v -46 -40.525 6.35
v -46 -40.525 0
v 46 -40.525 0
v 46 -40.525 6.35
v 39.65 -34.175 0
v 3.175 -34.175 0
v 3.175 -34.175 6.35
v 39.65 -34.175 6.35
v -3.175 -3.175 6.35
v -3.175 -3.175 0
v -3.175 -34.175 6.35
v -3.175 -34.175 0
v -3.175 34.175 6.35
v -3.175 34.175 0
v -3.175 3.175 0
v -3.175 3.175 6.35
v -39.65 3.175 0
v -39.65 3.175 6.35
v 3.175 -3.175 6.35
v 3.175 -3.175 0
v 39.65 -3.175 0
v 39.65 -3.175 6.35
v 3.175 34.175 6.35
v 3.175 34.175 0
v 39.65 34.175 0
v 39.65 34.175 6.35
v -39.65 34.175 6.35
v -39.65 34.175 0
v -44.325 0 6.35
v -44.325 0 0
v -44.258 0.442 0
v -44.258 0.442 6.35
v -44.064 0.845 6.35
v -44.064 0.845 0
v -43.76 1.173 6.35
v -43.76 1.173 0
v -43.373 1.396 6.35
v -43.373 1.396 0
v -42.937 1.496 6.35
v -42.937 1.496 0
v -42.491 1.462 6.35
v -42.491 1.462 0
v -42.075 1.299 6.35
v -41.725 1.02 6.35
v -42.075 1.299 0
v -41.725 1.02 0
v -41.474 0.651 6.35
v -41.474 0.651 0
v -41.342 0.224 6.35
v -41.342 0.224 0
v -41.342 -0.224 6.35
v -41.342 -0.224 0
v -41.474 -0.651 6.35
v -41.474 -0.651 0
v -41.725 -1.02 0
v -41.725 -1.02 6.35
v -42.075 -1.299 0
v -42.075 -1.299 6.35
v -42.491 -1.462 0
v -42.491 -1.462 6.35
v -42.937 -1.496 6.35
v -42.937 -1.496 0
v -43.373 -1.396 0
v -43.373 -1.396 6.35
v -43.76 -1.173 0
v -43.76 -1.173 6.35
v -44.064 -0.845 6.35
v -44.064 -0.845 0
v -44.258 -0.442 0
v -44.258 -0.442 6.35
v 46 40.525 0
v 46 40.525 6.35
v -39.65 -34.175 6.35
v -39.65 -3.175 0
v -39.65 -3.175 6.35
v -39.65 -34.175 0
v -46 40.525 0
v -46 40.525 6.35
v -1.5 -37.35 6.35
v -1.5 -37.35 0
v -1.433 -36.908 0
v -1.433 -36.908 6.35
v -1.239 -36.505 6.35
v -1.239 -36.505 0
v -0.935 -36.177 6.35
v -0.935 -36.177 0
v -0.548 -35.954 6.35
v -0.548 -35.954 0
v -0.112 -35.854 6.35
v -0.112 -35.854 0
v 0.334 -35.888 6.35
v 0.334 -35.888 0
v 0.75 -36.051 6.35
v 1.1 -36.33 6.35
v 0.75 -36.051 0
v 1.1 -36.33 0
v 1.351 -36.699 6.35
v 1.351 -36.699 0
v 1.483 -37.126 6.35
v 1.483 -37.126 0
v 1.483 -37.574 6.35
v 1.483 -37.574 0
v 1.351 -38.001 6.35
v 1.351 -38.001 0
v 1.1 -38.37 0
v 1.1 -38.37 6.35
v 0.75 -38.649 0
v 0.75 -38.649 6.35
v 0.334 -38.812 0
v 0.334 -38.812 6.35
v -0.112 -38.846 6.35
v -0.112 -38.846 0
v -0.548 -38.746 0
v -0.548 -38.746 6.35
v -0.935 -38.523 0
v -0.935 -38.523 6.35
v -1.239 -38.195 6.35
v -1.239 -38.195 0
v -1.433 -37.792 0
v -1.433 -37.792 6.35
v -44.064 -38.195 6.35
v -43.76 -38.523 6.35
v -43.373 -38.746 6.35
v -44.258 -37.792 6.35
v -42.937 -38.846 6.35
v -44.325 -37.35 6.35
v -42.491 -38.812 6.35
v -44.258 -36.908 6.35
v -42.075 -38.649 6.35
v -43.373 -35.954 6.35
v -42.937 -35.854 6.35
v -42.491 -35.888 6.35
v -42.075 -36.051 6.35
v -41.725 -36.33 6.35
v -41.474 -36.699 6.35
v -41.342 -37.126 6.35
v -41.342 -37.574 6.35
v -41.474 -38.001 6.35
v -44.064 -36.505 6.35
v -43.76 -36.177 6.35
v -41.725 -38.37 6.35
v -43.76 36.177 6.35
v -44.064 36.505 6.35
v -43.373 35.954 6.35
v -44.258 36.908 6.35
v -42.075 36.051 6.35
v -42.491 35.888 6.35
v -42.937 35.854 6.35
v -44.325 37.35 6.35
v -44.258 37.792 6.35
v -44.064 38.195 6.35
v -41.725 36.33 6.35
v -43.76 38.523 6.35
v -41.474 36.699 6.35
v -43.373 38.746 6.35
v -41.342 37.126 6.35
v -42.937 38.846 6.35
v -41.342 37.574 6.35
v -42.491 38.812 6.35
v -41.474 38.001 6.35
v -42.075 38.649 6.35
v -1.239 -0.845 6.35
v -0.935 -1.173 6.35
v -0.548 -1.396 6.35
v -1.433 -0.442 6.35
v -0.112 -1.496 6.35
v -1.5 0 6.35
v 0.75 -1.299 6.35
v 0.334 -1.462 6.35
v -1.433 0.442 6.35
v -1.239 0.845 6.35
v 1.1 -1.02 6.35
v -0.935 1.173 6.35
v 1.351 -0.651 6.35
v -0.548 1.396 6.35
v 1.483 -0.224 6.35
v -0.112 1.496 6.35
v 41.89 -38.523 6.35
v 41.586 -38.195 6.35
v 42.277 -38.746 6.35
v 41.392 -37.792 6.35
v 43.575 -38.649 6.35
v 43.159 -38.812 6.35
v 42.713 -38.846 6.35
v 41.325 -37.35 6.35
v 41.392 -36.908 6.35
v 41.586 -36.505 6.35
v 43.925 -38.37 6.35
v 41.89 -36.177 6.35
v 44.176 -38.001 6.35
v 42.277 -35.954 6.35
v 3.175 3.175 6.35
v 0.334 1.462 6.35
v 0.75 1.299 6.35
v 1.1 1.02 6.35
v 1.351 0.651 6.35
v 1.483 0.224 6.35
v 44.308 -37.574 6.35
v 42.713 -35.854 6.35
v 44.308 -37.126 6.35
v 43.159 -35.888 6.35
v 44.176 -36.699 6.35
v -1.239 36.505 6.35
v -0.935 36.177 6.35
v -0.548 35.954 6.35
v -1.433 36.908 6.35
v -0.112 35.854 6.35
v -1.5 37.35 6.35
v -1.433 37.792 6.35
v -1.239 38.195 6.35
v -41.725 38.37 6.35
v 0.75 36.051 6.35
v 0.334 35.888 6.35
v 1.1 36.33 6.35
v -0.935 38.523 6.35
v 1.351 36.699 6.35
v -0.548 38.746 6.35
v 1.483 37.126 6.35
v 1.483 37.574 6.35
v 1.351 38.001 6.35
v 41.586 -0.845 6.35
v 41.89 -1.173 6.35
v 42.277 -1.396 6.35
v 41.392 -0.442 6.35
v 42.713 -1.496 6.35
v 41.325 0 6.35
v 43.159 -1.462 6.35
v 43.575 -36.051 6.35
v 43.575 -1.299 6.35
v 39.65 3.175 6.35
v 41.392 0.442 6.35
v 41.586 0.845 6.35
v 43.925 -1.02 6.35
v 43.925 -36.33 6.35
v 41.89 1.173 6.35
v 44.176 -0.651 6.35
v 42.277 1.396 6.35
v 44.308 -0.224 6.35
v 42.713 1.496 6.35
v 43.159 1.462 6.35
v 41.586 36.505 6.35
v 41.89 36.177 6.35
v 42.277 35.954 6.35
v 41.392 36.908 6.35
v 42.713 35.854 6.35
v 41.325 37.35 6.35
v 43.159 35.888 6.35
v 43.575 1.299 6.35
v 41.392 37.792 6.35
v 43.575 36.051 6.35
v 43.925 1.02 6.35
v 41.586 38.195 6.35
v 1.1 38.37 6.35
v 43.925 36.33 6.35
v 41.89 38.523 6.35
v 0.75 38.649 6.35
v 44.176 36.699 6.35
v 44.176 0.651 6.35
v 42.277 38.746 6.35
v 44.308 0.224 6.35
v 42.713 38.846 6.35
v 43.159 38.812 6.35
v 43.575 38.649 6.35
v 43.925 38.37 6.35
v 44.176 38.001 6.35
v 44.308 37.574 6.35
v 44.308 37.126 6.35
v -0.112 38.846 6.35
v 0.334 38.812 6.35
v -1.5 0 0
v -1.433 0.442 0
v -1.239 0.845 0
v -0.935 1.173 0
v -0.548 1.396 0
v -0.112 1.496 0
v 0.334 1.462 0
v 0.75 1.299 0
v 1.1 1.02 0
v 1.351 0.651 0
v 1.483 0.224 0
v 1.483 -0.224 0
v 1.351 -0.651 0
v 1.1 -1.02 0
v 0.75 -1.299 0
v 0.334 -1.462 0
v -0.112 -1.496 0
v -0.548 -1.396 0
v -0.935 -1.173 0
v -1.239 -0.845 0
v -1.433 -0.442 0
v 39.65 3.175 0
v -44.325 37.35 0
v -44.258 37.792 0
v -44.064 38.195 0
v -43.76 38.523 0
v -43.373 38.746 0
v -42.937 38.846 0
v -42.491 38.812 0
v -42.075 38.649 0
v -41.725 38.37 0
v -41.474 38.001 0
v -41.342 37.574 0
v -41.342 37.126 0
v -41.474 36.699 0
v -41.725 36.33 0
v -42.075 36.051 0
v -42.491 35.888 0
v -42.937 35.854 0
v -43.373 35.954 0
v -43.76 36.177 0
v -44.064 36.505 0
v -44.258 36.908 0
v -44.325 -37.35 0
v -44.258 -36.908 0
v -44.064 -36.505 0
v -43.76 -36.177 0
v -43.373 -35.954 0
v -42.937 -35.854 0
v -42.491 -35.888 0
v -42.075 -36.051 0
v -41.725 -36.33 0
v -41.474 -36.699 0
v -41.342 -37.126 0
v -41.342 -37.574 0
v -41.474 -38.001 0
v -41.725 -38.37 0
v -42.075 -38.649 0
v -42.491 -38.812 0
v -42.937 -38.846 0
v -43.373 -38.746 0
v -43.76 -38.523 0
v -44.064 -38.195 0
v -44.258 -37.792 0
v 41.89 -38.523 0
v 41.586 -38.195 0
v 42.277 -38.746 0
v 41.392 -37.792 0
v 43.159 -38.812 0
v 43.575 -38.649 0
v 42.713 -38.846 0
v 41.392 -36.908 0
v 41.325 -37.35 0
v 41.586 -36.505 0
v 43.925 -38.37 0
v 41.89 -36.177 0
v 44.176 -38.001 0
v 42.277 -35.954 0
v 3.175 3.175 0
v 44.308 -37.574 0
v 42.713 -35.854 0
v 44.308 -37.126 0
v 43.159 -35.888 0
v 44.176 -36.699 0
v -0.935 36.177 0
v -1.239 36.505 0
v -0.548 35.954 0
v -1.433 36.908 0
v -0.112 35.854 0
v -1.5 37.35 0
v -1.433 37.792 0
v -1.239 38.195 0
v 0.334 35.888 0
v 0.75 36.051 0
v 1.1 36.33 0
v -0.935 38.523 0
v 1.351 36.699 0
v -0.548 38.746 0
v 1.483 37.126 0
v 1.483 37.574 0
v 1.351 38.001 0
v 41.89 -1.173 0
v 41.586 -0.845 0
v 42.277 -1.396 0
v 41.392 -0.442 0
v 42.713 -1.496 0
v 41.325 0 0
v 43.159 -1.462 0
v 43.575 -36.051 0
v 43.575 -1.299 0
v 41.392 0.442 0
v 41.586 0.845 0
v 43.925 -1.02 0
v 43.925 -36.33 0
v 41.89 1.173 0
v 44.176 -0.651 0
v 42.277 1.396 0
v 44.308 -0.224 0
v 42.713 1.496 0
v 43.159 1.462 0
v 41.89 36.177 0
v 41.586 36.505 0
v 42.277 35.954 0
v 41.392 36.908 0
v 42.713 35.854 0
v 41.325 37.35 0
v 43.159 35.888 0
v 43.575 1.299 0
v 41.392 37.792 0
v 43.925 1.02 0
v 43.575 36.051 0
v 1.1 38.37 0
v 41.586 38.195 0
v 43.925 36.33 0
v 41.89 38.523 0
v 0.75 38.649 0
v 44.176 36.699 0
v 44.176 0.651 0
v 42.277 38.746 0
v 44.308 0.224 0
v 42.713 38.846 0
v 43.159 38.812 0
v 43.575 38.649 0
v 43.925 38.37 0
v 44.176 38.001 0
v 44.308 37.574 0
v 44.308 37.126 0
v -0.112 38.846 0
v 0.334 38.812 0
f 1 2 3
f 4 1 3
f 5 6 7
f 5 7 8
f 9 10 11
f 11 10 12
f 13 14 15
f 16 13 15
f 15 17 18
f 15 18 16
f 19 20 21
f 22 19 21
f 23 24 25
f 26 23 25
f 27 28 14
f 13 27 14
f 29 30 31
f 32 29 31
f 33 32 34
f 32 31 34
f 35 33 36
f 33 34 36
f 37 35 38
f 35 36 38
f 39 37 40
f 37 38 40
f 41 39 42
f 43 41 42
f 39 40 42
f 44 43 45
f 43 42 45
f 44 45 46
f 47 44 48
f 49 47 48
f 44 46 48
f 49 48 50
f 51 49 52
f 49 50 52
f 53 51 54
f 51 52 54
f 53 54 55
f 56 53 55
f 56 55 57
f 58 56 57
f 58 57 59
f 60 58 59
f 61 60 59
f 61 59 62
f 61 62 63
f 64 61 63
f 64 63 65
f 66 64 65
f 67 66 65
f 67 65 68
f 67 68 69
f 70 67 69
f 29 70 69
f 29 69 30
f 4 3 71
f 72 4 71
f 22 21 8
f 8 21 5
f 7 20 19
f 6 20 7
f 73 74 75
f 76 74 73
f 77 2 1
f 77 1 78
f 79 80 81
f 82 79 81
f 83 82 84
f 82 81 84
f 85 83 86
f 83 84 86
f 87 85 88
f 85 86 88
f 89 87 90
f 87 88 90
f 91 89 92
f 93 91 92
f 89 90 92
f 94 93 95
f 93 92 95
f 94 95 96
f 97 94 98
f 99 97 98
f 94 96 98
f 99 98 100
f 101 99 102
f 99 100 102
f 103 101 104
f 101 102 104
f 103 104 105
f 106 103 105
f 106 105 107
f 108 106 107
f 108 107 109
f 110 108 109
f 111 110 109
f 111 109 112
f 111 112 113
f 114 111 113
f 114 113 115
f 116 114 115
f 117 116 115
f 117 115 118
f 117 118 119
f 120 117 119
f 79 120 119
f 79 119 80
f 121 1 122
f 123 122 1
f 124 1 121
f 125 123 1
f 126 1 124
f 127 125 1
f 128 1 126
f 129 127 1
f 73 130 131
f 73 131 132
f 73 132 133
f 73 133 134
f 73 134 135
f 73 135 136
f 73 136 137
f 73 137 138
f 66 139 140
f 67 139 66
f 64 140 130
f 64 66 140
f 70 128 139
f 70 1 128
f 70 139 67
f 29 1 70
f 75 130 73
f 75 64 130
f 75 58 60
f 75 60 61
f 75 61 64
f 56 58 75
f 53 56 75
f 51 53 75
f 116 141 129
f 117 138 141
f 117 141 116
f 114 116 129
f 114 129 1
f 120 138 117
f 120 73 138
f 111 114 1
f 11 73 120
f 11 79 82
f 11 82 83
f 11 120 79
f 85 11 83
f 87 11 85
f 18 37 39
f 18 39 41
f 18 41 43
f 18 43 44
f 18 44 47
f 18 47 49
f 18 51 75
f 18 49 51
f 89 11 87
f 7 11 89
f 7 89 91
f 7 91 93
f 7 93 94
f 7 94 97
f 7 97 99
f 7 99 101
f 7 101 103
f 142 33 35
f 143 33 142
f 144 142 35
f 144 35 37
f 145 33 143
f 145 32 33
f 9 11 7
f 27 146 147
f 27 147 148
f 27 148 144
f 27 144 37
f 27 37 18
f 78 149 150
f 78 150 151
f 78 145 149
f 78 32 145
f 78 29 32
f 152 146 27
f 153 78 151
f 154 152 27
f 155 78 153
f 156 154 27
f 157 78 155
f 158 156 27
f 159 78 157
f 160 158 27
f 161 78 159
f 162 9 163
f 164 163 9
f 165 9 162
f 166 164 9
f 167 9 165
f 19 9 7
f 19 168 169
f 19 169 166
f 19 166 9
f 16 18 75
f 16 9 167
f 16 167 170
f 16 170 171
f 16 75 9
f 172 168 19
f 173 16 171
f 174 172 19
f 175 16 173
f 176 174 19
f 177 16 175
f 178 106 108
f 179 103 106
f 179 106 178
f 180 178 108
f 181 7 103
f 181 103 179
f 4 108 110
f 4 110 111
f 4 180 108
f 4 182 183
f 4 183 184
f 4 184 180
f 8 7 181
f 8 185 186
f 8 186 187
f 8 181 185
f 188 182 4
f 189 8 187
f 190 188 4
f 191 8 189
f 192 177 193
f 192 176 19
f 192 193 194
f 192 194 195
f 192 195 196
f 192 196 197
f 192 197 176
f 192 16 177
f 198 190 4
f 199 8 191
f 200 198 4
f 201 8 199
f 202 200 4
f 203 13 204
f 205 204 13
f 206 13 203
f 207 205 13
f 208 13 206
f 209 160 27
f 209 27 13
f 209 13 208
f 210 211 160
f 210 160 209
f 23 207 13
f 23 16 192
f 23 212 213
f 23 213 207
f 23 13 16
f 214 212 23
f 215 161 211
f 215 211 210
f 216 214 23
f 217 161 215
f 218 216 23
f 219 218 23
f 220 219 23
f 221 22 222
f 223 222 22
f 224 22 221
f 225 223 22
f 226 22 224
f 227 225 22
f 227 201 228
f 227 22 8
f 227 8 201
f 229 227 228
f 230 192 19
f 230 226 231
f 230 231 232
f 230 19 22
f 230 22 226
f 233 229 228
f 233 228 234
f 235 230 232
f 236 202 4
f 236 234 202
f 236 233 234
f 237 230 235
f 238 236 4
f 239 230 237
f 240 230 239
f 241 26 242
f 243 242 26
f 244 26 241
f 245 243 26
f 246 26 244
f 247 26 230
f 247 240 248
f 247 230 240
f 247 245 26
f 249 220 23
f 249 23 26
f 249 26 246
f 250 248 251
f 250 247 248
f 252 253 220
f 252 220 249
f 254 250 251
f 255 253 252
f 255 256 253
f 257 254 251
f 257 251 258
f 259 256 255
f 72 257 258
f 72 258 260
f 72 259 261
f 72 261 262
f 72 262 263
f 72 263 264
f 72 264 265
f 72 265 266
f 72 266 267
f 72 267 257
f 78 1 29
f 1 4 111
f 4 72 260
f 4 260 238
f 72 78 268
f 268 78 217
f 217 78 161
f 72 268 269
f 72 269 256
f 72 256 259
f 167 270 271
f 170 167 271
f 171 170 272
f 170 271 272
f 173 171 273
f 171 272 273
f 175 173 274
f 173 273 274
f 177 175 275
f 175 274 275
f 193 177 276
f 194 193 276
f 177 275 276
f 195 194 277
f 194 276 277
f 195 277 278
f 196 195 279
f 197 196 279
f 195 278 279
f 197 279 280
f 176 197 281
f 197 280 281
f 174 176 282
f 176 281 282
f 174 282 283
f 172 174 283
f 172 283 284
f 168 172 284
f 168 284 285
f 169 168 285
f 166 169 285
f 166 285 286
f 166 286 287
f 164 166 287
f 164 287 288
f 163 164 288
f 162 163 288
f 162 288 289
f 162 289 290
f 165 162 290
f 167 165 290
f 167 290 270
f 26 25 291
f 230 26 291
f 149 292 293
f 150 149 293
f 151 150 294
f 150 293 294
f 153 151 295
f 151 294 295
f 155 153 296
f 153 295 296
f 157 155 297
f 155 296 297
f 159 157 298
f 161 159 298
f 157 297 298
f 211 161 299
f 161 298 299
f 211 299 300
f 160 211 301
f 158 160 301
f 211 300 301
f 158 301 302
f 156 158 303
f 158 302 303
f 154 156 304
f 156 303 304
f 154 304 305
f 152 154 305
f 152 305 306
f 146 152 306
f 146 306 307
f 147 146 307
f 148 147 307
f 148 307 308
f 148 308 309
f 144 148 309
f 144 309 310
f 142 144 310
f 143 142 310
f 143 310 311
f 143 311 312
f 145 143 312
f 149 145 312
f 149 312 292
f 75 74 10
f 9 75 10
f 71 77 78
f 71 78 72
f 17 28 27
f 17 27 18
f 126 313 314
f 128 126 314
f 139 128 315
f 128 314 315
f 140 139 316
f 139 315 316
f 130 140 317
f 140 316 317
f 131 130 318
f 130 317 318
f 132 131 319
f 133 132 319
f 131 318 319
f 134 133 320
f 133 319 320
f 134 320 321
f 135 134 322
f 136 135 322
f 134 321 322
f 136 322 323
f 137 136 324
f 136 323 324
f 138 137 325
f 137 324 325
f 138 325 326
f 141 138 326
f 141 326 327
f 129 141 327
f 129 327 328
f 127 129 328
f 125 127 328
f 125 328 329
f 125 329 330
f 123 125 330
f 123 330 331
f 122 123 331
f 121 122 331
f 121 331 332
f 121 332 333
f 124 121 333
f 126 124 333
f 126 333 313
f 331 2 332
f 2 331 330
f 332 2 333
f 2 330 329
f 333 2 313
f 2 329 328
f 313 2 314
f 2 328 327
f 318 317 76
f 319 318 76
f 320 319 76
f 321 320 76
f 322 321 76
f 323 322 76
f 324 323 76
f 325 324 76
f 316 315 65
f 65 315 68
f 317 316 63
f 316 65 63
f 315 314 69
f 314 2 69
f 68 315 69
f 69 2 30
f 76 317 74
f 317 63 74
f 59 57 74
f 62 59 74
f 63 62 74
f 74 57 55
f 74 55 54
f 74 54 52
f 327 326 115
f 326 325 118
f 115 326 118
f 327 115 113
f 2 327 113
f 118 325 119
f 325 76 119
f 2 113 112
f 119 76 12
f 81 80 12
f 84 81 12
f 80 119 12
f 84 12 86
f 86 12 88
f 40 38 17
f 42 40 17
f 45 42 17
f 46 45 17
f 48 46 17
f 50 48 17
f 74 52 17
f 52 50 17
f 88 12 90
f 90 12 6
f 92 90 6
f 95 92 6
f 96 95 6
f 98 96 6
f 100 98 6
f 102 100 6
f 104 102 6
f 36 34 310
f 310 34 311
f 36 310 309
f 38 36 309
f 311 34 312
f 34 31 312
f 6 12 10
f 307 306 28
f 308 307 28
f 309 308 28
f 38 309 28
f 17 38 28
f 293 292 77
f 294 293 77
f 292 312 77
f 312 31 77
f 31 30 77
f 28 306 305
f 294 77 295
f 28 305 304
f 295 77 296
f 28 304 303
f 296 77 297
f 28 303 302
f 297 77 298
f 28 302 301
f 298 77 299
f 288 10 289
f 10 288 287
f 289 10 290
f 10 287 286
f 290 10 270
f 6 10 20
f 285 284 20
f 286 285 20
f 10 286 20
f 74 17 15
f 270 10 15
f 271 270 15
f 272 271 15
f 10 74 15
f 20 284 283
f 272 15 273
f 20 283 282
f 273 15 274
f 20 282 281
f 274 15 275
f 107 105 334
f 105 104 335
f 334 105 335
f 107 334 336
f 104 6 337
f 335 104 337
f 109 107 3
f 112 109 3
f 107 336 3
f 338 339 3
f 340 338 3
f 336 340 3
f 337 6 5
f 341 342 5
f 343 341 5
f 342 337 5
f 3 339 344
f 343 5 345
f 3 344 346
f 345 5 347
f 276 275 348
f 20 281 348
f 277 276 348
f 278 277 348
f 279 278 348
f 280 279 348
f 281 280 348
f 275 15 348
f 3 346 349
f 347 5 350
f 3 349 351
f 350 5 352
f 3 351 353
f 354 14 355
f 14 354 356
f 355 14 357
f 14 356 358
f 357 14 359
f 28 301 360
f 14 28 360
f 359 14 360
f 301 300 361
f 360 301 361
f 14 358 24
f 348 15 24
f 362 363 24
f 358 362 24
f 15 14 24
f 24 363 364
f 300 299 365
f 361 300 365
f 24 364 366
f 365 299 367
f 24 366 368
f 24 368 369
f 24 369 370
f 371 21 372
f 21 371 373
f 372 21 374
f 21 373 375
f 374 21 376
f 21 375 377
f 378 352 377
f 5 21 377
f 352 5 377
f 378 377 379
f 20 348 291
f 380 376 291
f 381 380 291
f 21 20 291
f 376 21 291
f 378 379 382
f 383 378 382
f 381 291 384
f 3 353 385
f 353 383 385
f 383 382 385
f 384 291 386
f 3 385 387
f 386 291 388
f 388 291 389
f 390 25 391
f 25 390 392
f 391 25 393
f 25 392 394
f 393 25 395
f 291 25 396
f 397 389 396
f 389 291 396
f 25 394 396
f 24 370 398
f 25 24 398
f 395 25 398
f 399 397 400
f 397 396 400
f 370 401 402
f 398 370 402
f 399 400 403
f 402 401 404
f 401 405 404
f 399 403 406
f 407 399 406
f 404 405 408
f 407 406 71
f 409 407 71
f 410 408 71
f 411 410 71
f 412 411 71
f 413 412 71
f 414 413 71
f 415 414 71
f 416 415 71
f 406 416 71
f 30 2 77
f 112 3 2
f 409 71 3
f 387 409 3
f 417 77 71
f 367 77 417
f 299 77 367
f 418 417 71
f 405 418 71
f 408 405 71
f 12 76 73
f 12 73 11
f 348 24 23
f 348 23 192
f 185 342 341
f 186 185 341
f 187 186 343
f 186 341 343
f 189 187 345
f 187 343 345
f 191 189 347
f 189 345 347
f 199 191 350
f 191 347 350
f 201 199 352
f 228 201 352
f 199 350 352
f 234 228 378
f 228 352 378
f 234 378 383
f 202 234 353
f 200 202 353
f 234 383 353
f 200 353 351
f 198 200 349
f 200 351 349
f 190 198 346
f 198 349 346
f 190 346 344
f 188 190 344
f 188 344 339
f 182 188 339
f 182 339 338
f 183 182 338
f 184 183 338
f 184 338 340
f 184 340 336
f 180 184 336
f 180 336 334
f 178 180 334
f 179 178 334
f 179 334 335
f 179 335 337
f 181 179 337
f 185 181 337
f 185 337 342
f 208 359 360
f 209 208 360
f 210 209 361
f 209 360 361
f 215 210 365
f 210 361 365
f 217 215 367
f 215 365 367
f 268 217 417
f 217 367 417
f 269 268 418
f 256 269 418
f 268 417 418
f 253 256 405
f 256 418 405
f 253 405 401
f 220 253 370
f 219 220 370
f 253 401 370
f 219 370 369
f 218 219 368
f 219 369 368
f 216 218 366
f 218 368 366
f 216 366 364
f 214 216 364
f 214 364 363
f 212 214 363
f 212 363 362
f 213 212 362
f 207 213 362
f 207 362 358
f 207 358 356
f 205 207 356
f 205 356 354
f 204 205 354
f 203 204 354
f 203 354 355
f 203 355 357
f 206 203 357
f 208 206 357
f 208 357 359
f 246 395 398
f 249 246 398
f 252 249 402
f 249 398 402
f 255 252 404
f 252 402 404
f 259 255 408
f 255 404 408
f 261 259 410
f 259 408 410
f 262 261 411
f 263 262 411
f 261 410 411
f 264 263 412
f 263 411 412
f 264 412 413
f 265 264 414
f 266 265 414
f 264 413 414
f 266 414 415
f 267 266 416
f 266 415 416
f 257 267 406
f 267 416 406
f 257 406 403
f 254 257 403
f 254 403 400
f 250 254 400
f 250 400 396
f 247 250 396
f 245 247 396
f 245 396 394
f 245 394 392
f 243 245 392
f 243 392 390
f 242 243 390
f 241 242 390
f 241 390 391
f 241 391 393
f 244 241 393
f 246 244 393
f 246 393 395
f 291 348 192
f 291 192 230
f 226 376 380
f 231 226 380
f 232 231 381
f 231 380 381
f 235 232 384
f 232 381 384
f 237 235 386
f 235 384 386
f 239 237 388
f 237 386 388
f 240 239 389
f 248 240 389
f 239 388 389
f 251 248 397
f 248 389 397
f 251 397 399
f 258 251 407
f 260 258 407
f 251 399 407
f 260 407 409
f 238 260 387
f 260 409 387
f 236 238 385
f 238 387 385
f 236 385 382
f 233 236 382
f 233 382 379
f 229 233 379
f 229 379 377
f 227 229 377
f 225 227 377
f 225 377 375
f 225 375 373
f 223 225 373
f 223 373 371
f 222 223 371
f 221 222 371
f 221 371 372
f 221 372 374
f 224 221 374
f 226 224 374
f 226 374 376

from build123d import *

# Parameters (mm, degrees)
F0_W     = 92
F0_H     = 81.05
F1_DEPTH = 6.35
F3_W     = 36.475
F3_H     = 31
F4_DEPTH = 6.35
F5_D     = 3


with BuildPart() as f1:
    # F0 (on Top) → F1 (new body)
    with BuildSketch(Plane.XY):
        Rectangle(F0_W, F0_H)
    extrude(amount=F1_DEPTH)

    # F3 (on face) → F4 (cut)
    with BuildSketch(Plane(origin=(0, 0, 0), x_dir=(1, 0, 0), z_dir=(0, 0, -1))):
        with Locations((-21.4125, 18.675)):
            Rectangle(F3_W, F3_H)
        with Locations((-21.4125, -18.675)):
            Rectangle(F3_W, F3_H)
        with Locations((21.4125, 18.675)):
            Rectangle(F3_W, F3_H)
        with Locations((21.4125, -18.675)):
            Rectangle(F3_W, F3_H)
    extrude(amount=-F4_DEPTH, mode=Mode.SUBTRACT)

    # F5 (through all)
    with Locations(Plane.XY.offset(6.35)):
        with Locations((-42.825, 37.35), (0, 37.35), (42.825, 37.35), (-42.825, 0), (0, 0), (42.825, 0), (-42.825, -37.35), (0, -37.35), (42.825, -37.35)):
            Hole(F5_D / 2)


solid = f1.part
